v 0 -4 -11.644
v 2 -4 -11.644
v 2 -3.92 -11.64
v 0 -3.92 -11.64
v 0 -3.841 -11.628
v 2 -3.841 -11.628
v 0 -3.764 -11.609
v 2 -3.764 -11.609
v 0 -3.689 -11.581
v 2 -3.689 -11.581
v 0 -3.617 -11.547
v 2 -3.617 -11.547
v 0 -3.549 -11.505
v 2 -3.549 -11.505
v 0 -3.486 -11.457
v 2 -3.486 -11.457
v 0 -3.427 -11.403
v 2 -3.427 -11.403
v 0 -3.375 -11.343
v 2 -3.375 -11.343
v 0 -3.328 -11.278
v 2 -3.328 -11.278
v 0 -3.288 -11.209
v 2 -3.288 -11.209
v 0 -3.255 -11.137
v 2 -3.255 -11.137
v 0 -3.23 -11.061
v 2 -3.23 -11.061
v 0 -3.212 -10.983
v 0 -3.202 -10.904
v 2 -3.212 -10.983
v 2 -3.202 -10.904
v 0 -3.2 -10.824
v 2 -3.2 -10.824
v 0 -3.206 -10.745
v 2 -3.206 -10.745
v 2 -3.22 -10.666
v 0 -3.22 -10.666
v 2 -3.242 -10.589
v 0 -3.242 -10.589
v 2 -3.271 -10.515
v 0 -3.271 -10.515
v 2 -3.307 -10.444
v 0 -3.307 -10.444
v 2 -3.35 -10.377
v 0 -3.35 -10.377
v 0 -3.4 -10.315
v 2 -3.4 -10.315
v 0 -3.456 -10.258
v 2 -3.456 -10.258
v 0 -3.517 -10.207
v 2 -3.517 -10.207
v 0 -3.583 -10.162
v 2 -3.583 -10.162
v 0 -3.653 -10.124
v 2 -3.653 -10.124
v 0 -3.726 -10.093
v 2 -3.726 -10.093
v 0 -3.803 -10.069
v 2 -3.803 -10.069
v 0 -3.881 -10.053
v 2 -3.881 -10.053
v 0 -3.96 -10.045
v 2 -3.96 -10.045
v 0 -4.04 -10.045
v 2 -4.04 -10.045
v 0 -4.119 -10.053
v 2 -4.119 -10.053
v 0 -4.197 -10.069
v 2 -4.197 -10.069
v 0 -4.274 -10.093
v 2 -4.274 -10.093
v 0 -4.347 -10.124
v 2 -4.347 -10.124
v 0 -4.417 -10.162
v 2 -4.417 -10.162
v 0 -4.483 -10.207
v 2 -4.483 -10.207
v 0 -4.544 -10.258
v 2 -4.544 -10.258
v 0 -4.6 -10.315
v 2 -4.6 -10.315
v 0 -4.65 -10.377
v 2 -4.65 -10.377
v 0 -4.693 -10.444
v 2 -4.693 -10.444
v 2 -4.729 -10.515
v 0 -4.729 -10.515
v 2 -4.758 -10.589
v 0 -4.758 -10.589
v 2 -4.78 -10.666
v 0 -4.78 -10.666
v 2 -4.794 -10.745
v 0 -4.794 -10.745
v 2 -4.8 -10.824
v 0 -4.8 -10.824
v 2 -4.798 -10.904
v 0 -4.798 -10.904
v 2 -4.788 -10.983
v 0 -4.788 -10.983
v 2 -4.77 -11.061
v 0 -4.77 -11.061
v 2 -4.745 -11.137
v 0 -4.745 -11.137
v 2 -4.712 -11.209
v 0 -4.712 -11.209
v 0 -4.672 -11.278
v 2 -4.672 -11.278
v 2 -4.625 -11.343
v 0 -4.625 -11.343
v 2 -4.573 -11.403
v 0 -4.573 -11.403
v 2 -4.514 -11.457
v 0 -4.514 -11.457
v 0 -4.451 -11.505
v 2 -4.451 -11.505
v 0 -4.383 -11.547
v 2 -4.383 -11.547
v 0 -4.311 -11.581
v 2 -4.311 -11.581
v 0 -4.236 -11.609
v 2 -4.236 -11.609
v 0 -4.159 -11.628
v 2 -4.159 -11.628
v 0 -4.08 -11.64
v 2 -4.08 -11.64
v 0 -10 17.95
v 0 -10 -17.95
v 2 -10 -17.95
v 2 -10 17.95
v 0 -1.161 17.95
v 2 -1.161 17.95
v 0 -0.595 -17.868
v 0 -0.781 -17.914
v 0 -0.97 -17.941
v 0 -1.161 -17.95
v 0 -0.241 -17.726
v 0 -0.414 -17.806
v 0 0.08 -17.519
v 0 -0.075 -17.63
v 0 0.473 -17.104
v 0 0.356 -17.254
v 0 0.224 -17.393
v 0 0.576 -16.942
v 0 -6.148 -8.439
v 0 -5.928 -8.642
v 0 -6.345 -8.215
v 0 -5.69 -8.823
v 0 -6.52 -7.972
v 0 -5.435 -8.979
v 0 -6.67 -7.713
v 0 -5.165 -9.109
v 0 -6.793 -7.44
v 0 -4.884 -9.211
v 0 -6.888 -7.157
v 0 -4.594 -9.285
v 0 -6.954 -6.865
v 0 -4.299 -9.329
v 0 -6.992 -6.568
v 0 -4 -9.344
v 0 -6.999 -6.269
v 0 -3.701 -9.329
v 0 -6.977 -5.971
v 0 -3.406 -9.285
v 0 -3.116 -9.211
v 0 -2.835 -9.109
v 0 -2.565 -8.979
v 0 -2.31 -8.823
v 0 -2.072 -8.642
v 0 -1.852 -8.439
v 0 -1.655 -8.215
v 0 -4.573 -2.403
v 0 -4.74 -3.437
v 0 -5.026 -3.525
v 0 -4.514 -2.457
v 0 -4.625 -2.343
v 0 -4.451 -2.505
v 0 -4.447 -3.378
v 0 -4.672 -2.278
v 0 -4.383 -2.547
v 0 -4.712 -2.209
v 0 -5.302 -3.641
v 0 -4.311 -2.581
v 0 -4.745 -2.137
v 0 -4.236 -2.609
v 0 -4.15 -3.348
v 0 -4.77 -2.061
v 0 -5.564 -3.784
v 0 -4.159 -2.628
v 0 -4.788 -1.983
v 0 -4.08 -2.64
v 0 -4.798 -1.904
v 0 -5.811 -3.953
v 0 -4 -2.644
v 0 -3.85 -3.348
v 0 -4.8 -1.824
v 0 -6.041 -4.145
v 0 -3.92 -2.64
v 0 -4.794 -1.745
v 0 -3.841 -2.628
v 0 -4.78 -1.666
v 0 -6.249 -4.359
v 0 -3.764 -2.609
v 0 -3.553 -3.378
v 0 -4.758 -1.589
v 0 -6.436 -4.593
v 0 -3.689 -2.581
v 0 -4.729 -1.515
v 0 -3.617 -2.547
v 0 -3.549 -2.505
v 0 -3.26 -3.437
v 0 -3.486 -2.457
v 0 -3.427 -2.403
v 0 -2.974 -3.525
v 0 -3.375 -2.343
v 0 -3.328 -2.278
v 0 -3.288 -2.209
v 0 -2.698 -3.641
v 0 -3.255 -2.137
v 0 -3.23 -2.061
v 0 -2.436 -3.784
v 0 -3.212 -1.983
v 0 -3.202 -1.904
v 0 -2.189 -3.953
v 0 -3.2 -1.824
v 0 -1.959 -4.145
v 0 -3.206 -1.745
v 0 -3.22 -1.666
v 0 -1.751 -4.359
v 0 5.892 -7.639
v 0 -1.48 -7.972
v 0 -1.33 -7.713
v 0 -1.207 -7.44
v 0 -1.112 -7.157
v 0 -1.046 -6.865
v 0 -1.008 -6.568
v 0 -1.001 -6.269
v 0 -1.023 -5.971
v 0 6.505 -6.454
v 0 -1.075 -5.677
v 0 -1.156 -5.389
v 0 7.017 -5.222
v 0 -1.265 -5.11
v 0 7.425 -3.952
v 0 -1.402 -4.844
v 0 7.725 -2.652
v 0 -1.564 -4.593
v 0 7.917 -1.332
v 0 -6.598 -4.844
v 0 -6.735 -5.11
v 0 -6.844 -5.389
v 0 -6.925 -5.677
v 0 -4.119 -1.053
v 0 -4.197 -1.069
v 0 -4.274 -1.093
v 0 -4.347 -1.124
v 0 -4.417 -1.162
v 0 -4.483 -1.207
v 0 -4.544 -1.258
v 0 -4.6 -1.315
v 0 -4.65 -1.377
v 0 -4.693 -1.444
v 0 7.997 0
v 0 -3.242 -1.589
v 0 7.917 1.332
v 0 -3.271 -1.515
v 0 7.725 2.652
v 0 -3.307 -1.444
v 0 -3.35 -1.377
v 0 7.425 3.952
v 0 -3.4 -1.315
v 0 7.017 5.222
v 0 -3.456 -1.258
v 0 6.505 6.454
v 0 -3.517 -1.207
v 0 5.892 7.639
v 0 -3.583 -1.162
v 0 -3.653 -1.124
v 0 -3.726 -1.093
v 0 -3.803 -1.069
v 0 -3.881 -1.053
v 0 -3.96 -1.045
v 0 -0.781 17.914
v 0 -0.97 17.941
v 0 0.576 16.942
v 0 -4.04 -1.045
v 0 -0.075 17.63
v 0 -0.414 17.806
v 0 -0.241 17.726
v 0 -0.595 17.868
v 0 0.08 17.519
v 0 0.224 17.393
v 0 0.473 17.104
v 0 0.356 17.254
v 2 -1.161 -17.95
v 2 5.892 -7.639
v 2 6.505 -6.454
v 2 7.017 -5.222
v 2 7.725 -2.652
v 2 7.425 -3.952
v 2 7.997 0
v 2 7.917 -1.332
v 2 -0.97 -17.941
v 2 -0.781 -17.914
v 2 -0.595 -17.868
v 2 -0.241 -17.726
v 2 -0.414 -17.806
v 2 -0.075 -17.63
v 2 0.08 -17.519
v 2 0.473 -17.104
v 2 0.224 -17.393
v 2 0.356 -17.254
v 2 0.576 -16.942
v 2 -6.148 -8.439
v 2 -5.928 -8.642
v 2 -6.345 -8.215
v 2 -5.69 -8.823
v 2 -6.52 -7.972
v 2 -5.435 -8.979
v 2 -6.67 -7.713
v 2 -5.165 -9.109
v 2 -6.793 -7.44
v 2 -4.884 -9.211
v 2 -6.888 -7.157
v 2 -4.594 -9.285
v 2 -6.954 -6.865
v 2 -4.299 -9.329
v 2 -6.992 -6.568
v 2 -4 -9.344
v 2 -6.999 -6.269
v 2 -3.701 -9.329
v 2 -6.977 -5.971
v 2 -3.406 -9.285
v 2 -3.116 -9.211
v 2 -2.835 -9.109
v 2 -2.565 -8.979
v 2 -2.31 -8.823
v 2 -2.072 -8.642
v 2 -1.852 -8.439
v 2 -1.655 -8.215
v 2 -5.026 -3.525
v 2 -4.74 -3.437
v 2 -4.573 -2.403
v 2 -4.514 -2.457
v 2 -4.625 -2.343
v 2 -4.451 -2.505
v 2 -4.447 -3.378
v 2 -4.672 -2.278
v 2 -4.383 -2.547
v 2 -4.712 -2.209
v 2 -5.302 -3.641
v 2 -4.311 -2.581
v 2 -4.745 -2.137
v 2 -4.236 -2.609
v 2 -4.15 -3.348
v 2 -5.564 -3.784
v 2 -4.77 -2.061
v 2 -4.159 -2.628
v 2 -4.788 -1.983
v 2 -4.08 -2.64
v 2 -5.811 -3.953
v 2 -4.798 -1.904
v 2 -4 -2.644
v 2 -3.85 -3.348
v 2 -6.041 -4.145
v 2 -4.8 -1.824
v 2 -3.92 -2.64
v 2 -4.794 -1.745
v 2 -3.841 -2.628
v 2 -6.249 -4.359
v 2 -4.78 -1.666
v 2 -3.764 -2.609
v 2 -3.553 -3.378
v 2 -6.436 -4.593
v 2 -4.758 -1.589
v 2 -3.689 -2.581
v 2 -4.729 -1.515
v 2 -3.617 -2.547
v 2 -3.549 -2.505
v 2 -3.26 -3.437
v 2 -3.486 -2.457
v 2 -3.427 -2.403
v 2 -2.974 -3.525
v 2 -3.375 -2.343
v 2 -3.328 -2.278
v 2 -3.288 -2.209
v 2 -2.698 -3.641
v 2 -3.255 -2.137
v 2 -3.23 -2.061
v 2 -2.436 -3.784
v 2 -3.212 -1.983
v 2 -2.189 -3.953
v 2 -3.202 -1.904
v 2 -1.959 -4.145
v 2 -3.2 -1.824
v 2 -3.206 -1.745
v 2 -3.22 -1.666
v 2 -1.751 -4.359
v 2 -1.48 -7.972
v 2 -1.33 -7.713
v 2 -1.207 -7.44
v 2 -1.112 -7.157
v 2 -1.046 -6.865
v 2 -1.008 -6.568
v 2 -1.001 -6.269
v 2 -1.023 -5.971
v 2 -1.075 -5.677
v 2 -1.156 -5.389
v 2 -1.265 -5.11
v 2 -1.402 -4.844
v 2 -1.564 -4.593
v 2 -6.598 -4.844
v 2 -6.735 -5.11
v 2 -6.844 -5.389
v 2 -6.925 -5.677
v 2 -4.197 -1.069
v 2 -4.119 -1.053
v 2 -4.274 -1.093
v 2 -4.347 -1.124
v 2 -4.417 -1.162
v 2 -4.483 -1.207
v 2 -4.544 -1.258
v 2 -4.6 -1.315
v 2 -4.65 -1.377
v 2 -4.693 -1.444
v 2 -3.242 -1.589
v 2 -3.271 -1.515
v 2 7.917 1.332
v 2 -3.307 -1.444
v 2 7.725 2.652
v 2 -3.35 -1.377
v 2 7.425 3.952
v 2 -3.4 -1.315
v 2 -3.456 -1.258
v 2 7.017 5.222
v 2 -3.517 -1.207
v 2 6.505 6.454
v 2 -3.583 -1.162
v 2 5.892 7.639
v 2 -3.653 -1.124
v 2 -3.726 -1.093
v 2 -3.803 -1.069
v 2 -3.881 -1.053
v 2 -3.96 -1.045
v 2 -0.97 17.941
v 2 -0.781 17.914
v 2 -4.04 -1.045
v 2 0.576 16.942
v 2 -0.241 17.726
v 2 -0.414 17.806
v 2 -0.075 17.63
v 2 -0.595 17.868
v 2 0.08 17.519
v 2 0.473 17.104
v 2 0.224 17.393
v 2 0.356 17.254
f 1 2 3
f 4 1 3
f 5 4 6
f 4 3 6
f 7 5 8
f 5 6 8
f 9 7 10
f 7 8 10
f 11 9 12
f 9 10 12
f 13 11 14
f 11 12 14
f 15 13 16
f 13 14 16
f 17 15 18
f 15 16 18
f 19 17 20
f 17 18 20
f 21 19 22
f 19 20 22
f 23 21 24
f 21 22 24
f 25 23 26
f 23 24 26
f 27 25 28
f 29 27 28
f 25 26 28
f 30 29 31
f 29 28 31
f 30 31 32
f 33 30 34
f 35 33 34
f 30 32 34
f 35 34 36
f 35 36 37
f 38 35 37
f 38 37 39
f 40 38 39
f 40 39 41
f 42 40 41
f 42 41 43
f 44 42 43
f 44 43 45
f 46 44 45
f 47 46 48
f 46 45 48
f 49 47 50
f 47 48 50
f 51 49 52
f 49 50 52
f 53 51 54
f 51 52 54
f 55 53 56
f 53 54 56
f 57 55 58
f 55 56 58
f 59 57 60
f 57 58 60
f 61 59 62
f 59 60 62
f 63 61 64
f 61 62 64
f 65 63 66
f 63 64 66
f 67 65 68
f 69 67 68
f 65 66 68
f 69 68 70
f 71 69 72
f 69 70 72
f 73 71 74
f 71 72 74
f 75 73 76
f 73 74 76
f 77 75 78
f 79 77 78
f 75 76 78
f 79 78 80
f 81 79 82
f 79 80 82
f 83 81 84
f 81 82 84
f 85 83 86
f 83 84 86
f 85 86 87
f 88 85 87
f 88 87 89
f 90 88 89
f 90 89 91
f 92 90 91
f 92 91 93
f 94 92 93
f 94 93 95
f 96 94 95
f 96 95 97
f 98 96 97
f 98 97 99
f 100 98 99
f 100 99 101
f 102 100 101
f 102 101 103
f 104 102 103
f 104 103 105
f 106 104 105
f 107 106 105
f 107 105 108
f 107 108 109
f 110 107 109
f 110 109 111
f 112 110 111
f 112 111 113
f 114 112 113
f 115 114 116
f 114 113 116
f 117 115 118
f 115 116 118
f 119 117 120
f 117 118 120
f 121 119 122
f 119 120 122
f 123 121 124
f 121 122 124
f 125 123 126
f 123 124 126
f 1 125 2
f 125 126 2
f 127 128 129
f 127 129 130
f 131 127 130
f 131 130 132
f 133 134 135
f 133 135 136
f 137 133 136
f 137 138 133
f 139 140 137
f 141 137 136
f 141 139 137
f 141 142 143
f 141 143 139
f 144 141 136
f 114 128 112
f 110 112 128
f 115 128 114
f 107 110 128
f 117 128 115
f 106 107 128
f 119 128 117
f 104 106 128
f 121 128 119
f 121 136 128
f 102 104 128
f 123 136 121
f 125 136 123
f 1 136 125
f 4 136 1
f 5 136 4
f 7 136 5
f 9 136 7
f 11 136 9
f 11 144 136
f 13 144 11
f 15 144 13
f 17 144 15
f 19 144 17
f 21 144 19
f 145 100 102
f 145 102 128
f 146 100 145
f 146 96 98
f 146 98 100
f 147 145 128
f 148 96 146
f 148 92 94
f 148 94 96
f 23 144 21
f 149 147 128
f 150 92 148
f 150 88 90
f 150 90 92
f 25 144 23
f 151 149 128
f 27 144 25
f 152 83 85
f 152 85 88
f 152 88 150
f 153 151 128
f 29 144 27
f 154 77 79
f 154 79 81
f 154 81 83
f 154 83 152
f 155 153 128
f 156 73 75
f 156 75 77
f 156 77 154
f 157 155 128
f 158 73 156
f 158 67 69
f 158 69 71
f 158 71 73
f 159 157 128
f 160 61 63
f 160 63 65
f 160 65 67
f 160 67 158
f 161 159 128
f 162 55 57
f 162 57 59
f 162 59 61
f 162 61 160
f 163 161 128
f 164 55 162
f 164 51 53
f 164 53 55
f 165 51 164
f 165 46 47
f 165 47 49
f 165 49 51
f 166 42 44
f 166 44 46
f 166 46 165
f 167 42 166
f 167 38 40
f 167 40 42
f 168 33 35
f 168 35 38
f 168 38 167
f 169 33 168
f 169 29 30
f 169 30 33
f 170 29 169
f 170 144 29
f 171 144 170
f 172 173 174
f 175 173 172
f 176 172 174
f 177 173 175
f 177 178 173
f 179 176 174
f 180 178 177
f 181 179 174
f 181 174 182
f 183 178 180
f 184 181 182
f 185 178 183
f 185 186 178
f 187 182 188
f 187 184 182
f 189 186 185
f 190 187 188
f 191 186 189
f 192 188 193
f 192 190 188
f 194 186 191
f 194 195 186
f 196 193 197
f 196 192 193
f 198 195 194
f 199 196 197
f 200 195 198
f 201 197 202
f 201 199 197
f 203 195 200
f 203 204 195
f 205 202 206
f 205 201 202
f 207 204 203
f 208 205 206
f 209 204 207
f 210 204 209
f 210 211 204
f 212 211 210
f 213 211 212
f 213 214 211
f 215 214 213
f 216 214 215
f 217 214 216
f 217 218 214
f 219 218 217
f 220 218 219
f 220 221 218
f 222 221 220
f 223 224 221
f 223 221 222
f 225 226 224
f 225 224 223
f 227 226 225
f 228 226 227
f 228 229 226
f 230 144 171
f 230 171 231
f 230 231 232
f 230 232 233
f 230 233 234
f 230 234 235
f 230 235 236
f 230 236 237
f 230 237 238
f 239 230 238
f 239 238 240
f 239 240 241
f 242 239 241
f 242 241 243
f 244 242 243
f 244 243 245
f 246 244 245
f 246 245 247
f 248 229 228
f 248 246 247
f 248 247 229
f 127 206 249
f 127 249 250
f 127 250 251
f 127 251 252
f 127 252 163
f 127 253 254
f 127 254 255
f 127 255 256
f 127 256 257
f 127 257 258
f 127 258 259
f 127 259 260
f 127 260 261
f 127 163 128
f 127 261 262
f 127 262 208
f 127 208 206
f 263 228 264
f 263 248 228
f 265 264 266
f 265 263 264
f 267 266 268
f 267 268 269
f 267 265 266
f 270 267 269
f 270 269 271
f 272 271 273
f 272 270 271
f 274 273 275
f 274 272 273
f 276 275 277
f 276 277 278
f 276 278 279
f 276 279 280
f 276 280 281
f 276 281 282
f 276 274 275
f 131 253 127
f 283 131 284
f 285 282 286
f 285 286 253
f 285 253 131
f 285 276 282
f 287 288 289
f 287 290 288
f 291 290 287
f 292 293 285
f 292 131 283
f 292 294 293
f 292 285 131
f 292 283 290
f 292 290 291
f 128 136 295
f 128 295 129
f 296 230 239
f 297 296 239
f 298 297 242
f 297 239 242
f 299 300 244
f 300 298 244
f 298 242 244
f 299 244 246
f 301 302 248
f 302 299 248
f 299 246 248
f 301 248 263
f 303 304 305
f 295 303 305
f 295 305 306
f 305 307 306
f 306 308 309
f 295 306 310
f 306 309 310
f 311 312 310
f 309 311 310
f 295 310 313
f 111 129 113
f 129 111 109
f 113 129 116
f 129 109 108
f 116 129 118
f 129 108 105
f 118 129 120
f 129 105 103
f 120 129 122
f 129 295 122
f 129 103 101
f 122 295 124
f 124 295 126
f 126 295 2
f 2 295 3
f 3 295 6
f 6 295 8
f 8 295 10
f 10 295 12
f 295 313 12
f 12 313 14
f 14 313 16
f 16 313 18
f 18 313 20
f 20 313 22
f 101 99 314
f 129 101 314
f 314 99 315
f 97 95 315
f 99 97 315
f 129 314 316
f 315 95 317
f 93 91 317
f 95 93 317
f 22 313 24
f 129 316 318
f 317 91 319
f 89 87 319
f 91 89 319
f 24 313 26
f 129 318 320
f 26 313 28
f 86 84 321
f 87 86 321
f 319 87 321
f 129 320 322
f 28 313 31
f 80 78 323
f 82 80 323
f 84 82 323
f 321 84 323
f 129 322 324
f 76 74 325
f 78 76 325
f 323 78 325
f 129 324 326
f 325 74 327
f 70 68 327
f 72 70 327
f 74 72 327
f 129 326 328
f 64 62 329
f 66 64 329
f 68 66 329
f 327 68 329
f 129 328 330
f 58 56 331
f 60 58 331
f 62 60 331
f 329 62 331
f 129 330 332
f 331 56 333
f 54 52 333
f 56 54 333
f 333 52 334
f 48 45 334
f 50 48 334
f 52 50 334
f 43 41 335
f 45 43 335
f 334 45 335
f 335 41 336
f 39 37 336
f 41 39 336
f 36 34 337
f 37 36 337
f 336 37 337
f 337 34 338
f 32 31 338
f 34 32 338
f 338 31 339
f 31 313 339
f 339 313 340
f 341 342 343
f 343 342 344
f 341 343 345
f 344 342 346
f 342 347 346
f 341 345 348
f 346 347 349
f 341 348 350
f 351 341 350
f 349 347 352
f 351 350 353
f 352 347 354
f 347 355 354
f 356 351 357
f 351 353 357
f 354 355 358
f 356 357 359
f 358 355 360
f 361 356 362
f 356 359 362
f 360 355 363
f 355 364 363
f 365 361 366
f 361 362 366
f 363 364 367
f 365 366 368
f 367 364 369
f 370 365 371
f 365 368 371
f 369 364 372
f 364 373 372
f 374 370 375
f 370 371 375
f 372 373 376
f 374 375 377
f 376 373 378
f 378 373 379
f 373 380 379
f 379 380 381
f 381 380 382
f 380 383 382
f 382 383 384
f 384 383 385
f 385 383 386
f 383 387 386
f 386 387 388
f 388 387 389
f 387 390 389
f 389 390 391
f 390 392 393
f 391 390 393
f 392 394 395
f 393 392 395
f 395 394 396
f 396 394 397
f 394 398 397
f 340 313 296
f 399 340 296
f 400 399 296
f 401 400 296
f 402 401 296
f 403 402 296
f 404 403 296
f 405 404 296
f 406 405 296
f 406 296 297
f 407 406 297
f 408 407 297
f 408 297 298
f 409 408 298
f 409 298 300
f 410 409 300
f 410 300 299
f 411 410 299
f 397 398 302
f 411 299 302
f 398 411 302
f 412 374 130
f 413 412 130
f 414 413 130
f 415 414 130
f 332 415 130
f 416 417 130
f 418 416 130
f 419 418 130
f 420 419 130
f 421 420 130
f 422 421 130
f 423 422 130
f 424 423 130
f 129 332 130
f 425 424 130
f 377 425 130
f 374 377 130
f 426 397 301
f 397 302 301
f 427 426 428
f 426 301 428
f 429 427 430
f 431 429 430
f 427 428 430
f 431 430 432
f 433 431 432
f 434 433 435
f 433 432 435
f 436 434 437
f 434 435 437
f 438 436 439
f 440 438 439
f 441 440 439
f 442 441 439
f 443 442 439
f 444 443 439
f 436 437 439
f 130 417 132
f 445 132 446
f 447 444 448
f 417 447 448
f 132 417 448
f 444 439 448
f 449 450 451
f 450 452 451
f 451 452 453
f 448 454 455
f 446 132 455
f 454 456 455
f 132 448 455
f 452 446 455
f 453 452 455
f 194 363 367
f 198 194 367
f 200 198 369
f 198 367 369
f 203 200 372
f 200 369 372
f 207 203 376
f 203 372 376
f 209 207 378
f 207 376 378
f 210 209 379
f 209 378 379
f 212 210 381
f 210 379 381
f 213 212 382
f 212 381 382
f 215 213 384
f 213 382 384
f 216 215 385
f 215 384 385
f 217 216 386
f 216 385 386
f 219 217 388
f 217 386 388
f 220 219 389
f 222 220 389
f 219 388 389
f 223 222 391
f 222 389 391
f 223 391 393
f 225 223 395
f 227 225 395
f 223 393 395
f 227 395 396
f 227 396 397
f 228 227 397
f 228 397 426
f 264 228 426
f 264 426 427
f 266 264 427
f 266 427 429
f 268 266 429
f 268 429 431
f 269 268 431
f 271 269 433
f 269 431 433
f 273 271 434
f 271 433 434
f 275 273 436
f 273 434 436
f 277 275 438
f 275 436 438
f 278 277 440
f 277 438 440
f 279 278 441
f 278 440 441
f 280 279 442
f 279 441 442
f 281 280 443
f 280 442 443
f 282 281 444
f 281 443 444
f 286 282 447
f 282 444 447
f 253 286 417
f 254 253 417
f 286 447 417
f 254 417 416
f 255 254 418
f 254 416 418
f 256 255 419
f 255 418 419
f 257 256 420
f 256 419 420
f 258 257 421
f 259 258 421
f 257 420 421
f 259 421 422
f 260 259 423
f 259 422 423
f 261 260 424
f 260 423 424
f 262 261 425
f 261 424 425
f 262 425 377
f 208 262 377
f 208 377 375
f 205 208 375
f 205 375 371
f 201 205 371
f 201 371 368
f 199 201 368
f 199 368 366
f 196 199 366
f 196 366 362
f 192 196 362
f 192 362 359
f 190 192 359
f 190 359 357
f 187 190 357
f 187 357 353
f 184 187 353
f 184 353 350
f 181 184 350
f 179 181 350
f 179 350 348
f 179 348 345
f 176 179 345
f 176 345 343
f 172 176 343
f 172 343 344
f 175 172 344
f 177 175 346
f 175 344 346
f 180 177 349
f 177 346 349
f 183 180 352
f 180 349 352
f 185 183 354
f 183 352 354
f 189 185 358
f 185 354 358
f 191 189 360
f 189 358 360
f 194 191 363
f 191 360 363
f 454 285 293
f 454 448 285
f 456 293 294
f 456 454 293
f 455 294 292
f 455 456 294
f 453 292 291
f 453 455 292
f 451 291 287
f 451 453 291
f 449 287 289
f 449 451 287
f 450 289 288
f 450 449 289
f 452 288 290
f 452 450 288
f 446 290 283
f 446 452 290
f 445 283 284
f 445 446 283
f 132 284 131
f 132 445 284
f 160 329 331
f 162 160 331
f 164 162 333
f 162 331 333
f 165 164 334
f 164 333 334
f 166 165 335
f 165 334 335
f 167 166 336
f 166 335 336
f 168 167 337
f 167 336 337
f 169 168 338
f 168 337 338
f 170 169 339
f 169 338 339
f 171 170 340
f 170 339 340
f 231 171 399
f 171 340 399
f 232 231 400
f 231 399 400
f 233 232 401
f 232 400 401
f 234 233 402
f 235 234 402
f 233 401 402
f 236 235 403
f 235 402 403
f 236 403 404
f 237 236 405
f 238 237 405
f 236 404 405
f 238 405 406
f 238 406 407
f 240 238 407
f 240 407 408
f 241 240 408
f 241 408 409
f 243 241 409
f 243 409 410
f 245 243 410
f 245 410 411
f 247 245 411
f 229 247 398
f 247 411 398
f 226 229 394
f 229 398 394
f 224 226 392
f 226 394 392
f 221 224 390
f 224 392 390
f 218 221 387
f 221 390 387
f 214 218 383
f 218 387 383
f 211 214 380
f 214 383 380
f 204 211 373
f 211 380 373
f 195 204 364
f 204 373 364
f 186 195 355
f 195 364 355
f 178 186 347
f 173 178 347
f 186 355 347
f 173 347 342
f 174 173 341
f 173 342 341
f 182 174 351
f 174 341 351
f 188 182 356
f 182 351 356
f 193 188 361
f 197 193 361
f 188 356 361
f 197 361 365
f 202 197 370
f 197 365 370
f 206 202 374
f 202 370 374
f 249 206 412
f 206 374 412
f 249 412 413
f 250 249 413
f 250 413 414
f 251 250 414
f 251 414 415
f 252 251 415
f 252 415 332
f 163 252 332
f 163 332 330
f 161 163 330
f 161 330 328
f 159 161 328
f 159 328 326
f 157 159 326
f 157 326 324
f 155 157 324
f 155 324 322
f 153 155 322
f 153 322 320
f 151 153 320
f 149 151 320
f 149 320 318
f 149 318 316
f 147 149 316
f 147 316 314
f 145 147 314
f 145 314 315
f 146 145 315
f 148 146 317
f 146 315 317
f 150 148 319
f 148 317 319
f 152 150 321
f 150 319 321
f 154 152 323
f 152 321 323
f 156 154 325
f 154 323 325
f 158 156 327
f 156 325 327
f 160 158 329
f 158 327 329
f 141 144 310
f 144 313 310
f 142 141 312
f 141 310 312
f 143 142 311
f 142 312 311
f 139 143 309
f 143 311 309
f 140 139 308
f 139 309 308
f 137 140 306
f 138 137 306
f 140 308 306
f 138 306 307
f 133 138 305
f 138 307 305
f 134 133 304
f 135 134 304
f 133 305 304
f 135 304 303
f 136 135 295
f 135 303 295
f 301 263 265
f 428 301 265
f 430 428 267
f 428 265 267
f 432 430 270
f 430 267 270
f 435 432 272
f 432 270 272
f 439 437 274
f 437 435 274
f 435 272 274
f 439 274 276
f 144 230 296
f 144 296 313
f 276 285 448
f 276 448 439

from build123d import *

# Parameters (mm, degrees)
EXTRUDE_1_DEPTH     = 2
SKETCH_2_R          = 3
SKETCH_2_R_2        = 0.8
CUT_EXTRUDE_1_DEPTH = 2
FILLET_1_R          = 2
FILLET_3_R          = 16


with BuildPart() as part:
    # Эскиз1 → Бобышка-Вытянуть1 (new body)
    with BuildSketch(Plane(origin=(0, 0, 0), x_dir=(0, 0, -1), z_dir=(1, 0, 0))):
        Polygon((-17.95, 0), (-3.95, 8), (3.95, 8), (17.95, 0), (17.95, -10), (-17.95, -10), align=None)
    extrude(amount=EXTRUDE_1_DEPTH)

    # Эскиз2 → Вырез-Вытянуть1 (cut)
    with BuildSketch(Plane(origin=(2, 0, 0), x_dir=(0, 0, -1), z_dir=(1, 0, 0))):
        with Locations((6.34428877, -4)):
            Circle(SKETCH_2_R)
        with Locations((1.84428877, -4)):
            Circle(SKETCH_2_R_2)
        with Locations((10.84428877, -4)):
            Circle(SKETCH_2_R_2)
    extrude(amount=-CUT_EXTRUDE_1_DEPTH, mode=Mode.SUBTRACT)

    # Скругление1
    fillet_1_edges = [part.edges().sort_by_distance(p)[0] for p in [
        (1, 0, 17.95),
        (1, 0, -17.95),
    ]]
    fillet(fillet_1_edges, radius=FILLET_1_R)

    # Скругление3
    # the kernel refuses this fillet: 16 mm, written as the material it takes off along each edge
    with BuildSketch(Plane(origin=(-10.622577483, 8, -3.95), x_dir=(0, 0, 1), z_dir=(1, 0, 0)), Plane(origin=(-10.622577483, 8, 3.95), x_dir=(0, -0.496138938356834, 0.868243142124459), z_dir=(1, 0, 0))) as fillet_3_piece_1:
        with BuildLine():
            CenterArc((FILLET_3_R * 0.265564437075, FILLET_3_R), FILLET_3_R, 240.255118703, 29.744881297)
            Line((-FILLET_3_R * 0.230574501282, FILLET_3_R * 0.131756857876), (0, 0))
            Line((0, 0), (FILLET_3_R * 0.265564437075, 0))
        make_face()
    extrude(amount=23.245154966, mode=Mode.SUBTRACT)


solid = part.part
